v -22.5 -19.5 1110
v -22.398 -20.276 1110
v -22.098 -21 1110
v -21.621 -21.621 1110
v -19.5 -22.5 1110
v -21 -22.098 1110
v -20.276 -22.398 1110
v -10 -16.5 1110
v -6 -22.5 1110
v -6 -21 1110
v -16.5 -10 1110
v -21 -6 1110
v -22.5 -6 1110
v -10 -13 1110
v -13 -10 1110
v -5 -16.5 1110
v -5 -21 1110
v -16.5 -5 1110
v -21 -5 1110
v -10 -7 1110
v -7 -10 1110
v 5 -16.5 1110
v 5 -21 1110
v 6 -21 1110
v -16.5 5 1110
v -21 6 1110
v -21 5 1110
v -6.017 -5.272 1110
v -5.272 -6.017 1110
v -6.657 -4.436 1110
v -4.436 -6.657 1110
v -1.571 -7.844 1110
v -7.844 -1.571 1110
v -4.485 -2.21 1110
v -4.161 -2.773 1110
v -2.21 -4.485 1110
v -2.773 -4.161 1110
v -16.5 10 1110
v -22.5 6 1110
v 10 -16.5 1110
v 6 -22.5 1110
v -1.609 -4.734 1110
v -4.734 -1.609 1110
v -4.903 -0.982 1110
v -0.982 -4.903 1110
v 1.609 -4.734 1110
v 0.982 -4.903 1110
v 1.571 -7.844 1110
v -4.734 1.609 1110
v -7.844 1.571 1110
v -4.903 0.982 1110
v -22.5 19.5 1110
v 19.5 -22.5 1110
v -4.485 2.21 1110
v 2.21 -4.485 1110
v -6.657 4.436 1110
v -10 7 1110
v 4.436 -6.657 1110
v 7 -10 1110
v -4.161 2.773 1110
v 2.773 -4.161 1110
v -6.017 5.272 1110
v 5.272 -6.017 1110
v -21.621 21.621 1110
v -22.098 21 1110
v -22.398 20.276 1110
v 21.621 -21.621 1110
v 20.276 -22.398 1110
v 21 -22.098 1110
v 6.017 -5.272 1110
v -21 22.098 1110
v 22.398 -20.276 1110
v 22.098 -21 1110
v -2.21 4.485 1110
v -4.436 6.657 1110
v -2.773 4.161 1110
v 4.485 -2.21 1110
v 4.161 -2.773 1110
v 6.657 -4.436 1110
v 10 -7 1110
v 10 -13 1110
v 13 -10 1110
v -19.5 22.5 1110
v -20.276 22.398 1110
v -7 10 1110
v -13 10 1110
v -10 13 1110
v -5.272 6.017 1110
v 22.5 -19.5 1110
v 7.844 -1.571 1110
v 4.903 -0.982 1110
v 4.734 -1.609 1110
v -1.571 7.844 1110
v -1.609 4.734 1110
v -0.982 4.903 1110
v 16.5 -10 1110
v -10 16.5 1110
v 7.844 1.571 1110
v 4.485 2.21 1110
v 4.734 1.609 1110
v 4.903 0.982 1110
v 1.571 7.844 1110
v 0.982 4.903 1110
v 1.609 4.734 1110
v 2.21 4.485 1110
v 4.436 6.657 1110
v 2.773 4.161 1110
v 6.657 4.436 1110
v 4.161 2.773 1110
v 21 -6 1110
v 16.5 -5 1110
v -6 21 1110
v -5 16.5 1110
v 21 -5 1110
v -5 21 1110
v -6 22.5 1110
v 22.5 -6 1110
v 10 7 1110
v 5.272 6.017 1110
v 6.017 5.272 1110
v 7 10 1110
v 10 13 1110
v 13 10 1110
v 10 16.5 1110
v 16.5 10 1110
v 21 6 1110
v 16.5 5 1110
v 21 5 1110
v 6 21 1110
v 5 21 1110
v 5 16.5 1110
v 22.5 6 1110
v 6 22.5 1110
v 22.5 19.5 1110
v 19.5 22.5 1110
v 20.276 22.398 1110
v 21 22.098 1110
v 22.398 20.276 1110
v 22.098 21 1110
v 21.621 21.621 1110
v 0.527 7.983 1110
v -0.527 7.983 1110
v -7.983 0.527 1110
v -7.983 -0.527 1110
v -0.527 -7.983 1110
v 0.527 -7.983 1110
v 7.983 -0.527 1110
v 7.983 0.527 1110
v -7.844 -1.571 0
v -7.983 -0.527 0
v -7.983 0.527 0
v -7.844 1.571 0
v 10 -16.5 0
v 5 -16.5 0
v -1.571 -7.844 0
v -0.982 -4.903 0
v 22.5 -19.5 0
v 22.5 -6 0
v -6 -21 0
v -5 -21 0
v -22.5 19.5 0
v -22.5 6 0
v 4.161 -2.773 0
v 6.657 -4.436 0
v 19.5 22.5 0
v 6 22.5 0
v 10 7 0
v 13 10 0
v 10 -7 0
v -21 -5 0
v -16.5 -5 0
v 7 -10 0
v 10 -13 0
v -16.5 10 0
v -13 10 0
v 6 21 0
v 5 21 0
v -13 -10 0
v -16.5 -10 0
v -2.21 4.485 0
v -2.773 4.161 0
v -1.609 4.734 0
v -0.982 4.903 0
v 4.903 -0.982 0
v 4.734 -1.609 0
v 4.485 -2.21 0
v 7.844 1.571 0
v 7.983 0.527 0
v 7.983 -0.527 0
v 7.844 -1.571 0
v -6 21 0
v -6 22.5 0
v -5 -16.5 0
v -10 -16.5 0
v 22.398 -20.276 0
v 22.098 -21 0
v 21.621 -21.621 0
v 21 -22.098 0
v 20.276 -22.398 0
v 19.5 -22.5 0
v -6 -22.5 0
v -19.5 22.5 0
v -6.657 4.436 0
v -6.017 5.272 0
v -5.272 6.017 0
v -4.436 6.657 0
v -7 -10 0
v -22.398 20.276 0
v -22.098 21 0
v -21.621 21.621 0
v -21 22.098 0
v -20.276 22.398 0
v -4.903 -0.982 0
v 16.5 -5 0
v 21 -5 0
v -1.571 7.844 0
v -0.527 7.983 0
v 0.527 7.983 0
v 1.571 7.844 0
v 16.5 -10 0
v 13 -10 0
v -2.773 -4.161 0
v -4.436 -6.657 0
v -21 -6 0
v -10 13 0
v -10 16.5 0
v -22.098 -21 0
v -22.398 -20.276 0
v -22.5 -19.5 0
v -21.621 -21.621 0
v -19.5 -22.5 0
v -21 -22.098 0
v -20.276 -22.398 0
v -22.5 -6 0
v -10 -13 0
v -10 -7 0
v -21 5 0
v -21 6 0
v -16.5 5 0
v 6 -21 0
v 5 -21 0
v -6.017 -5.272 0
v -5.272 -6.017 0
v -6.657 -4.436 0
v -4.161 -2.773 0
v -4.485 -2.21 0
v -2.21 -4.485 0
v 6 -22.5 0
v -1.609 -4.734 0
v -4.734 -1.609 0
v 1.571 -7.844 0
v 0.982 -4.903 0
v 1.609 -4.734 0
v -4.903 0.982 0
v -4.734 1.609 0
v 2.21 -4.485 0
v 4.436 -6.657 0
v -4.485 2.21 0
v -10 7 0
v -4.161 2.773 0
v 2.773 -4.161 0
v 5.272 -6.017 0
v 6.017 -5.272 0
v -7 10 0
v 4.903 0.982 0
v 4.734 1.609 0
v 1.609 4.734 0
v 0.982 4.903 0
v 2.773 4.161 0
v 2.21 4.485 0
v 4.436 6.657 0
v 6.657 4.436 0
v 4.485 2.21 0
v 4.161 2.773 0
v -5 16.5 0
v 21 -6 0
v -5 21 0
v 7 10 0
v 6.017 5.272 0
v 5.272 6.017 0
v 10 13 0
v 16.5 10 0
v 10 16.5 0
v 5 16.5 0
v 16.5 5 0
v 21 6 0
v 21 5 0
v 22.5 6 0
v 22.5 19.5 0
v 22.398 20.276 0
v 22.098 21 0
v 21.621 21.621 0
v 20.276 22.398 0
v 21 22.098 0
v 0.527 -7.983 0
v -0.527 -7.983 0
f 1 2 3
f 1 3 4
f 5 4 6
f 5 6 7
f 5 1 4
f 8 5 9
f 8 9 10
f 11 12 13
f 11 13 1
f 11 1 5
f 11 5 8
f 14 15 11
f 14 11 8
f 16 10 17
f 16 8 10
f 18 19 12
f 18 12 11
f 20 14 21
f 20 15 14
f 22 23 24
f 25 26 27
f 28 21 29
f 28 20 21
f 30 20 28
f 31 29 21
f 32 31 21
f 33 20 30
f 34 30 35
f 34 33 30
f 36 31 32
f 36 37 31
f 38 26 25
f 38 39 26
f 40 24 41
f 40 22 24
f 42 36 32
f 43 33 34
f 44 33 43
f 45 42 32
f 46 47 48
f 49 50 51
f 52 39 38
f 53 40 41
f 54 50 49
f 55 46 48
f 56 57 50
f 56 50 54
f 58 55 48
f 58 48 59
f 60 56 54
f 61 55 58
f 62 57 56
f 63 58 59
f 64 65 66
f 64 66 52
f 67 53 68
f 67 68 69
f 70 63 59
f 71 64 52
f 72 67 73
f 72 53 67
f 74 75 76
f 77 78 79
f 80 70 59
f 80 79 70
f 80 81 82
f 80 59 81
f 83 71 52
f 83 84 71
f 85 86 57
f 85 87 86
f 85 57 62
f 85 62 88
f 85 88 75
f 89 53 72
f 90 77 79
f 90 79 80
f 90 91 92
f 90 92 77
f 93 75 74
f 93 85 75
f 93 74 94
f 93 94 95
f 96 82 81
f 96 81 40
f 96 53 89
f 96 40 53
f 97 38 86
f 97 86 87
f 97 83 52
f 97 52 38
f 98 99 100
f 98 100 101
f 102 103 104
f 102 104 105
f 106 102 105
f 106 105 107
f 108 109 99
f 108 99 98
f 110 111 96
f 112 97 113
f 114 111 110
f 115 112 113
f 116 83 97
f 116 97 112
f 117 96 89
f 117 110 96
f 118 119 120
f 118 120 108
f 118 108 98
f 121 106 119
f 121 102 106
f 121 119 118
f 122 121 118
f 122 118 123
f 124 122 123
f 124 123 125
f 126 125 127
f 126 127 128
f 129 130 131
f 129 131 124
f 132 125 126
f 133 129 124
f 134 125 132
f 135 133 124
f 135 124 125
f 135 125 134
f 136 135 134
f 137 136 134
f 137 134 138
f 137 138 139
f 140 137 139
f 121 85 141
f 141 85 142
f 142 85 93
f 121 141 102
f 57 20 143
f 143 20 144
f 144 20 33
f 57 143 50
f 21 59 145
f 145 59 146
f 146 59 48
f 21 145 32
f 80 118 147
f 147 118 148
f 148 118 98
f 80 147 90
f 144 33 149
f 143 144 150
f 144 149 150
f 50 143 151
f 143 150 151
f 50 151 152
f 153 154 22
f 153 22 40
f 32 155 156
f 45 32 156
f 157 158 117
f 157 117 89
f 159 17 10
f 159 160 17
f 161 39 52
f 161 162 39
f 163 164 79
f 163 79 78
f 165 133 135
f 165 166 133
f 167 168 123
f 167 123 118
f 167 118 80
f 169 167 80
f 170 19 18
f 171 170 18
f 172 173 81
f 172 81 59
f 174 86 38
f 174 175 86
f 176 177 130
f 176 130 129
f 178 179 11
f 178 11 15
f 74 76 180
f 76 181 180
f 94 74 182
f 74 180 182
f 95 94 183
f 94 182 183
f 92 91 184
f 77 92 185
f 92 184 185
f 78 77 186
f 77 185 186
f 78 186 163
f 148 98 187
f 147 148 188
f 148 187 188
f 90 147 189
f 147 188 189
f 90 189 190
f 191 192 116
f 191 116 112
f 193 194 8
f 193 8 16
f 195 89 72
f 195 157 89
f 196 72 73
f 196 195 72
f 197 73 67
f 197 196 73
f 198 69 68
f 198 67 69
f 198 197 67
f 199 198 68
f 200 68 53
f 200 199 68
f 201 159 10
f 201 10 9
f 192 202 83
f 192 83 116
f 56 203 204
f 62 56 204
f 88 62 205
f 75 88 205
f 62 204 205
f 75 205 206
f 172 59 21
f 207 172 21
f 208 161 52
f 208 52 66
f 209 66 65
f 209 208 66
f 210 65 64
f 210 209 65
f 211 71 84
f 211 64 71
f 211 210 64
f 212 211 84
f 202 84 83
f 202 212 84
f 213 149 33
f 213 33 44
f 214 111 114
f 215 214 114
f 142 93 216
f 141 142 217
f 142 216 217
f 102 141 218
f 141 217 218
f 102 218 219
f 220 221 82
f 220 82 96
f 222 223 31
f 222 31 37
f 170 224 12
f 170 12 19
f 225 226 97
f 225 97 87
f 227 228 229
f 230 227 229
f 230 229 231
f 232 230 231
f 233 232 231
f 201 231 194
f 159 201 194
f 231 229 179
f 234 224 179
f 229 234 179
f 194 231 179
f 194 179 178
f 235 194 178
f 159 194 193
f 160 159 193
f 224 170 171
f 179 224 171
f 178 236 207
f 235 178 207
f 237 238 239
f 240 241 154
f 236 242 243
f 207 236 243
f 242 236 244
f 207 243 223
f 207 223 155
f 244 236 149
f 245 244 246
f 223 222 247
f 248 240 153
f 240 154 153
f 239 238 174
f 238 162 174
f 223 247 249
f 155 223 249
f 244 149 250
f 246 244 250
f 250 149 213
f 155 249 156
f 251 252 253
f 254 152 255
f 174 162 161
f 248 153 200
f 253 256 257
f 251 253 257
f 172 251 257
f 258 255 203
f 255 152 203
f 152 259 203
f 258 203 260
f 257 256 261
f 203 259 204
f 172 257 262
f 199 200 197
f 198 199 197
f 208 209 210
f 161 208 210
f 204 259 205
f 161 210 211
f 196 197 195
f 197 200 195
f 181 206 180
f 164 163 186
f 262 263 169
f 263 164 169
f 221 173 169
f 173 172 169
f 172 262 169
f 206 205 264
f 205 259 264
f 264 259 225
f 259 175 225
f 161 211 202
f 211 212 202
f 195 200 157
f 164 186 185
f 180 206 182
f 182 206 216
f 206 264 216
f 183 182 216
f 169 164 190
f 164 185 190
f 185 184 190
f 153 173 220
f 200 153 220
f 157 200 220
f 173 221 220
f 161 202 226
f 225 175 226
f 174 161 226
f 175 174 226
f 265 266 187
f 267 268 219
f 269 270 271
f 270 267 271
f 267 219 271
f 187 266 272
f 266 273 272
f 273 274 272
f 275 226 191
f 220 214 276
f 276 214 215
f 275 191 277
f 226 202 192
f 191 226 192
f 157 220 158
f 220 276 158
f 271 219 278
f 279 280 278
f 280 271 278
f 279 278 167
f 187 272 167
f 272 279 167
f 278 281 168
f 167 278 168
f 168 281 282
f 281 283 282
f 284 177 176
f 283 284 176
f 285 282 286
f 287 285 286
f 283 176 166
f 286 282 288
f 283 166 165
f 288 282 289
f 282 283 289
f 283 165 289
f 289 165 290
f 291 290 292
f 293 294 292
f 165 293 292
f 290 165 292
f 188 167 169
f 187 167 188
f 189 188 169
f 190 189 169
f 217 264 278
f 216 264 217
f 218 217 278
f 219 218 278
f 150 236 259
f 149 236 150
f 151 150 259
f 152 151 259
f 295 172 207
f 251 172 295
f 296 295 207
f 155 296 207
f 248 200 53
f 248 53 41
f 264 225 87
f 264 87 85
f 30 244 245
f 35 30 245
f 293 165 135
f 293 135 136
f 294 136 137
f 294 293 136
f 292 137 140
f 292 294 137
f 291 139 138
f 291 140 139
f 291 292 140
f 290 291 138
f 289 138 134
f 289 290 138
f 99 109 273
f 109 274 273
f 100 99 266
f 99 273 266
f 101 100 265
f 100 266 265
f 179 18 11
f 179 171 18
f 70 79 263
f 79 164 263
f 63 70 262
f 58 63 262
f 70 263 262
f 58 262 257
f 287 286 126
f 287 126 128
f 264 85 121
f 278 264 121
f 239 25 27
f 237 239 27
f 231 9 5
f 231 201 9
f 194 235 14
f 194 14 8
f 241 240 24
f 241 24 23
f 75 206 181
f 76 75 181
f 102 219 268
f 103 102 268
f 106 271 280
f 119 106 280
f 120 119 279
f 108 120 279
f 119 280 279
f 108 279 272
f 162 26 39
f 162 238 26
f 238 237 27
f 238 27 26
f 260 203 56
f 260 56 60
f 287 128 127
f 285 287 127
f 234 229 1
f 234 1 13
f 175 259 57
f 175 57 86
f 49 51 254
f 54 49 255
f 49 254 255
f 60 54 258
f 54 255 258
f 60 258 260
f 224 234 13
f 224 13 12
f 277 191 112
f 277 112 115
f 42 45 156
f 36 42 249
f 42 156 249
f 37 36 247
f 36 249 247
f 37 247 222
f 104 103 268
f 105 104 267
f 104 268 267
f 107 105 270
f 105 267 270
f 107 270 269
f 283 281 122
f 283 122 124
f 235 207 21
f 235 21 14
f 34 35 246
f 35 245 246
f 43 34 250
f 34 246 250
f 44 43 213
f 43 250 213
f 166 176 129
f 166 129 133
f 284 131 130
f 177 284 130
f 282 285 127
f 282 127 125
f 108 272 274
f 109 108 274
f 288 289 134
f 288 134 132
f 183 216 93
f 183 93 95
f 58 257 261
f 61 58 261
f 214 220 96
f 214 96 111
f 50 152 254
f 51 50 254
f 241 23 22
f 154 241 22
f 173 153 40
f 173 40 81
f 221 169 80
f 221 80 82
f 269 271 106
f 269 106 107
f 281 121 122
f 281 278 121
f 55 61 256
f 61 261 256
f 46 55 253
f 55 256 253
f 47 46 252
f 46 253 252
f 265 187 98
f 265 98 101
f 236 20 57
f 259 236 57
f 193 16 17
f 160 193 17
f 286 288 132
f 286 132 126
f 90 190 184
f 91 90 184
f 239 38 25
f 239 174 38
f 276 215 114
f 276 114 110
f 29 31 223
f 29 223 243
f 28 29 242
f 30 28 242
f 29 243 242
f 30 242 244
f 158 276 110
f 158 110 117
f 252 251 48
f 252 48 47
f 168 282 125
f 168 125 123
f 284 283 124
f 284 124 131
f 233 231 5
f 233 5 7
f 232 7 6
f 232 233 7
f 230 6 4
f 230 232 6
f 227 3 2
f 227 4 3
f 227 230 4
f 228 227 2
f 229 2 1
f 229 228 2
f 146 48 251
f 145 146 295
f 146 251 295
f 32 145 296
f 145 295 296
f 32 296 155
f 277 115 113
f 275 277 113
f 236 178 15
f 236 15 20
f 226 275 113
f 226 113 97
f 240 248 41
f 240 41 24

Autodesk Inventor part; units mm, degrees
ref_plane "YZ Plane" through (0, 0, 0) normal (1, 0, 0) x (0, 1, 0)
ref_plane "XZ Plane" through (0, 0, 0) normal (0, 1, 0) x (-1, 0, 0)
ref_plane "XY Plane" through (0, 0, 0) normal (0, 0, 1) x (1, 0, 0)
sketch "Skizze1" plane through (0, 0, 0) normal (0, 0, 1) x (1, 0, 0)
  line L0 (-19.5, 22.5) -> (19.5, 22.5)
  line L1 (22.5, 19.5) -> (22.5, -19.5)
  line L2 (19.5, -22.5) -> (-19.5, -22.5)
  line L3 (-22.5, -19.5) -> (-22.5, 19.5)
  circle A0 centre (0, 0) radius 5
  line L4 (-32.3698, 0) -> (32.3698, 0) projected
  line L5 (0, -32.3698) -> (0, 32.3698) projected
  arc A1 (22.5, 19.5) -> (19.5, 22.5) centre (19.5, 19.5) ccw
  arc A2 (-19.5, 22.5) -> (-22.5, 19.5) centre (-19.5, 19.5) ccw
  arc A3 (-22.5, -19.5) -> (-19.5, -22.5) centre (-19.5, -19.5) ccw
  arc A4 (19.5, -22.5) -> (22.5, -19.5) centre (19.5, -19.5) ccw
  point P0 (-22.5, 22.5)
  point P1 (22.5, 22.5)
  point P2 (-22.5, -22.5)
  dimension "d0" = 45
  dimension "d1" = 45
  dimension "d2" = 10
  dimension "d3" = 3
extrude "Extrusion1" add sketch "Skizze1" along normal blind 1110 contours L0 L5 A0 L4 L3 A2 | L0 A1 L1 L4 A0 L5 | L4 A0 L5 L2 A3 L3 | L4 L1 A4 L2 L5 A0
sketch "Skizze2" plane through (0, 0, 0) normal (0, 0, -1) x (-1, 0, 0)
  line L0 (19.5, -22.5) -> (-19.5, -22.5) projected
  line L1 (31.5, 0) -> (-31.5, 0) projected
  line L2 (0, -31.5) -> (0, 31.5) projected
  line L3 (-6, -22.5) -> (-6, -21)
  line L4 (-6, -21) -> (-5, -21)
  line L5 (-5, -21) -> (-5, -16.5)
  line L6 (-5, -16.5) -> (-10, -16.5)
  line L7 (-10, -16.5) -> (-10, -13)
  line L8 (-10, -13) -> (-7, -10)
  line L9 (-7, -10) -> (7, -10)
  line L10 (7, -10) -> (10, -13)
  line L11 (10, -13) -> (10, -16.5)
  line L12 (10, -16.5) -> (5, -16.5)
  line L13 (5, -16.5) -> (5, -21)
  line L14 (5, -21) -> (6, -21)
  line L15 (6, -21) -> (6, -22.5)
  dimension "d6" = 10
  dimension "d7" = 20
  dimension "d8" = 12
  dimension "d9" = 1.5
  dimension "d10" = 12.5
  dimension "d11" = 135
  dimension "d12" = 6
  dimension "d13" = 3.5
extrude "Extrusion2" cut sketch "Skizze2" against normal through all
pattern_circular "Runde Anordnung1" count 4 over 360 about axis through (0, 0, 0) along (0, 0, 1) of "Extrusion2"
sketch "Skizze3" plane through (0, 0, 0) normal (0, 0, -1) x (-1, 0, 0)
  circle A0 centre (0, 0) radius 5 projected
  line L0 (31.5, 0) -> (-31.5, 0) projected
  line L1 (0, -31.5) -> (0, 31.5) projected
  line L2 (-1.5708, 7.8443) -> (-0.9817, 4.9027)
  line L3 (1.5708, 7.8443) -> (0.9817, 4.9027)
  arc A1 (1.5708, 7.8443) -> (-1.5708, 7.8443) centre (0, 0) ccw
  dimension "d20" = 1.9635
  dimension "d21" = 3.1416
  dimension "d22" = 8
extrude "Extrusion3" cut sketch "Skizze3" against normal through all contours A0 L1 A1 L3 | A0 L2 A1 L1
pattern_circular "Runde Anordnung2" count 8 over 360 about axis through (0, 0, 0) along (0, 0, 1) of "Extrusion3"
properties part number "Alu-Profil Nut 10 45x45 1110"
